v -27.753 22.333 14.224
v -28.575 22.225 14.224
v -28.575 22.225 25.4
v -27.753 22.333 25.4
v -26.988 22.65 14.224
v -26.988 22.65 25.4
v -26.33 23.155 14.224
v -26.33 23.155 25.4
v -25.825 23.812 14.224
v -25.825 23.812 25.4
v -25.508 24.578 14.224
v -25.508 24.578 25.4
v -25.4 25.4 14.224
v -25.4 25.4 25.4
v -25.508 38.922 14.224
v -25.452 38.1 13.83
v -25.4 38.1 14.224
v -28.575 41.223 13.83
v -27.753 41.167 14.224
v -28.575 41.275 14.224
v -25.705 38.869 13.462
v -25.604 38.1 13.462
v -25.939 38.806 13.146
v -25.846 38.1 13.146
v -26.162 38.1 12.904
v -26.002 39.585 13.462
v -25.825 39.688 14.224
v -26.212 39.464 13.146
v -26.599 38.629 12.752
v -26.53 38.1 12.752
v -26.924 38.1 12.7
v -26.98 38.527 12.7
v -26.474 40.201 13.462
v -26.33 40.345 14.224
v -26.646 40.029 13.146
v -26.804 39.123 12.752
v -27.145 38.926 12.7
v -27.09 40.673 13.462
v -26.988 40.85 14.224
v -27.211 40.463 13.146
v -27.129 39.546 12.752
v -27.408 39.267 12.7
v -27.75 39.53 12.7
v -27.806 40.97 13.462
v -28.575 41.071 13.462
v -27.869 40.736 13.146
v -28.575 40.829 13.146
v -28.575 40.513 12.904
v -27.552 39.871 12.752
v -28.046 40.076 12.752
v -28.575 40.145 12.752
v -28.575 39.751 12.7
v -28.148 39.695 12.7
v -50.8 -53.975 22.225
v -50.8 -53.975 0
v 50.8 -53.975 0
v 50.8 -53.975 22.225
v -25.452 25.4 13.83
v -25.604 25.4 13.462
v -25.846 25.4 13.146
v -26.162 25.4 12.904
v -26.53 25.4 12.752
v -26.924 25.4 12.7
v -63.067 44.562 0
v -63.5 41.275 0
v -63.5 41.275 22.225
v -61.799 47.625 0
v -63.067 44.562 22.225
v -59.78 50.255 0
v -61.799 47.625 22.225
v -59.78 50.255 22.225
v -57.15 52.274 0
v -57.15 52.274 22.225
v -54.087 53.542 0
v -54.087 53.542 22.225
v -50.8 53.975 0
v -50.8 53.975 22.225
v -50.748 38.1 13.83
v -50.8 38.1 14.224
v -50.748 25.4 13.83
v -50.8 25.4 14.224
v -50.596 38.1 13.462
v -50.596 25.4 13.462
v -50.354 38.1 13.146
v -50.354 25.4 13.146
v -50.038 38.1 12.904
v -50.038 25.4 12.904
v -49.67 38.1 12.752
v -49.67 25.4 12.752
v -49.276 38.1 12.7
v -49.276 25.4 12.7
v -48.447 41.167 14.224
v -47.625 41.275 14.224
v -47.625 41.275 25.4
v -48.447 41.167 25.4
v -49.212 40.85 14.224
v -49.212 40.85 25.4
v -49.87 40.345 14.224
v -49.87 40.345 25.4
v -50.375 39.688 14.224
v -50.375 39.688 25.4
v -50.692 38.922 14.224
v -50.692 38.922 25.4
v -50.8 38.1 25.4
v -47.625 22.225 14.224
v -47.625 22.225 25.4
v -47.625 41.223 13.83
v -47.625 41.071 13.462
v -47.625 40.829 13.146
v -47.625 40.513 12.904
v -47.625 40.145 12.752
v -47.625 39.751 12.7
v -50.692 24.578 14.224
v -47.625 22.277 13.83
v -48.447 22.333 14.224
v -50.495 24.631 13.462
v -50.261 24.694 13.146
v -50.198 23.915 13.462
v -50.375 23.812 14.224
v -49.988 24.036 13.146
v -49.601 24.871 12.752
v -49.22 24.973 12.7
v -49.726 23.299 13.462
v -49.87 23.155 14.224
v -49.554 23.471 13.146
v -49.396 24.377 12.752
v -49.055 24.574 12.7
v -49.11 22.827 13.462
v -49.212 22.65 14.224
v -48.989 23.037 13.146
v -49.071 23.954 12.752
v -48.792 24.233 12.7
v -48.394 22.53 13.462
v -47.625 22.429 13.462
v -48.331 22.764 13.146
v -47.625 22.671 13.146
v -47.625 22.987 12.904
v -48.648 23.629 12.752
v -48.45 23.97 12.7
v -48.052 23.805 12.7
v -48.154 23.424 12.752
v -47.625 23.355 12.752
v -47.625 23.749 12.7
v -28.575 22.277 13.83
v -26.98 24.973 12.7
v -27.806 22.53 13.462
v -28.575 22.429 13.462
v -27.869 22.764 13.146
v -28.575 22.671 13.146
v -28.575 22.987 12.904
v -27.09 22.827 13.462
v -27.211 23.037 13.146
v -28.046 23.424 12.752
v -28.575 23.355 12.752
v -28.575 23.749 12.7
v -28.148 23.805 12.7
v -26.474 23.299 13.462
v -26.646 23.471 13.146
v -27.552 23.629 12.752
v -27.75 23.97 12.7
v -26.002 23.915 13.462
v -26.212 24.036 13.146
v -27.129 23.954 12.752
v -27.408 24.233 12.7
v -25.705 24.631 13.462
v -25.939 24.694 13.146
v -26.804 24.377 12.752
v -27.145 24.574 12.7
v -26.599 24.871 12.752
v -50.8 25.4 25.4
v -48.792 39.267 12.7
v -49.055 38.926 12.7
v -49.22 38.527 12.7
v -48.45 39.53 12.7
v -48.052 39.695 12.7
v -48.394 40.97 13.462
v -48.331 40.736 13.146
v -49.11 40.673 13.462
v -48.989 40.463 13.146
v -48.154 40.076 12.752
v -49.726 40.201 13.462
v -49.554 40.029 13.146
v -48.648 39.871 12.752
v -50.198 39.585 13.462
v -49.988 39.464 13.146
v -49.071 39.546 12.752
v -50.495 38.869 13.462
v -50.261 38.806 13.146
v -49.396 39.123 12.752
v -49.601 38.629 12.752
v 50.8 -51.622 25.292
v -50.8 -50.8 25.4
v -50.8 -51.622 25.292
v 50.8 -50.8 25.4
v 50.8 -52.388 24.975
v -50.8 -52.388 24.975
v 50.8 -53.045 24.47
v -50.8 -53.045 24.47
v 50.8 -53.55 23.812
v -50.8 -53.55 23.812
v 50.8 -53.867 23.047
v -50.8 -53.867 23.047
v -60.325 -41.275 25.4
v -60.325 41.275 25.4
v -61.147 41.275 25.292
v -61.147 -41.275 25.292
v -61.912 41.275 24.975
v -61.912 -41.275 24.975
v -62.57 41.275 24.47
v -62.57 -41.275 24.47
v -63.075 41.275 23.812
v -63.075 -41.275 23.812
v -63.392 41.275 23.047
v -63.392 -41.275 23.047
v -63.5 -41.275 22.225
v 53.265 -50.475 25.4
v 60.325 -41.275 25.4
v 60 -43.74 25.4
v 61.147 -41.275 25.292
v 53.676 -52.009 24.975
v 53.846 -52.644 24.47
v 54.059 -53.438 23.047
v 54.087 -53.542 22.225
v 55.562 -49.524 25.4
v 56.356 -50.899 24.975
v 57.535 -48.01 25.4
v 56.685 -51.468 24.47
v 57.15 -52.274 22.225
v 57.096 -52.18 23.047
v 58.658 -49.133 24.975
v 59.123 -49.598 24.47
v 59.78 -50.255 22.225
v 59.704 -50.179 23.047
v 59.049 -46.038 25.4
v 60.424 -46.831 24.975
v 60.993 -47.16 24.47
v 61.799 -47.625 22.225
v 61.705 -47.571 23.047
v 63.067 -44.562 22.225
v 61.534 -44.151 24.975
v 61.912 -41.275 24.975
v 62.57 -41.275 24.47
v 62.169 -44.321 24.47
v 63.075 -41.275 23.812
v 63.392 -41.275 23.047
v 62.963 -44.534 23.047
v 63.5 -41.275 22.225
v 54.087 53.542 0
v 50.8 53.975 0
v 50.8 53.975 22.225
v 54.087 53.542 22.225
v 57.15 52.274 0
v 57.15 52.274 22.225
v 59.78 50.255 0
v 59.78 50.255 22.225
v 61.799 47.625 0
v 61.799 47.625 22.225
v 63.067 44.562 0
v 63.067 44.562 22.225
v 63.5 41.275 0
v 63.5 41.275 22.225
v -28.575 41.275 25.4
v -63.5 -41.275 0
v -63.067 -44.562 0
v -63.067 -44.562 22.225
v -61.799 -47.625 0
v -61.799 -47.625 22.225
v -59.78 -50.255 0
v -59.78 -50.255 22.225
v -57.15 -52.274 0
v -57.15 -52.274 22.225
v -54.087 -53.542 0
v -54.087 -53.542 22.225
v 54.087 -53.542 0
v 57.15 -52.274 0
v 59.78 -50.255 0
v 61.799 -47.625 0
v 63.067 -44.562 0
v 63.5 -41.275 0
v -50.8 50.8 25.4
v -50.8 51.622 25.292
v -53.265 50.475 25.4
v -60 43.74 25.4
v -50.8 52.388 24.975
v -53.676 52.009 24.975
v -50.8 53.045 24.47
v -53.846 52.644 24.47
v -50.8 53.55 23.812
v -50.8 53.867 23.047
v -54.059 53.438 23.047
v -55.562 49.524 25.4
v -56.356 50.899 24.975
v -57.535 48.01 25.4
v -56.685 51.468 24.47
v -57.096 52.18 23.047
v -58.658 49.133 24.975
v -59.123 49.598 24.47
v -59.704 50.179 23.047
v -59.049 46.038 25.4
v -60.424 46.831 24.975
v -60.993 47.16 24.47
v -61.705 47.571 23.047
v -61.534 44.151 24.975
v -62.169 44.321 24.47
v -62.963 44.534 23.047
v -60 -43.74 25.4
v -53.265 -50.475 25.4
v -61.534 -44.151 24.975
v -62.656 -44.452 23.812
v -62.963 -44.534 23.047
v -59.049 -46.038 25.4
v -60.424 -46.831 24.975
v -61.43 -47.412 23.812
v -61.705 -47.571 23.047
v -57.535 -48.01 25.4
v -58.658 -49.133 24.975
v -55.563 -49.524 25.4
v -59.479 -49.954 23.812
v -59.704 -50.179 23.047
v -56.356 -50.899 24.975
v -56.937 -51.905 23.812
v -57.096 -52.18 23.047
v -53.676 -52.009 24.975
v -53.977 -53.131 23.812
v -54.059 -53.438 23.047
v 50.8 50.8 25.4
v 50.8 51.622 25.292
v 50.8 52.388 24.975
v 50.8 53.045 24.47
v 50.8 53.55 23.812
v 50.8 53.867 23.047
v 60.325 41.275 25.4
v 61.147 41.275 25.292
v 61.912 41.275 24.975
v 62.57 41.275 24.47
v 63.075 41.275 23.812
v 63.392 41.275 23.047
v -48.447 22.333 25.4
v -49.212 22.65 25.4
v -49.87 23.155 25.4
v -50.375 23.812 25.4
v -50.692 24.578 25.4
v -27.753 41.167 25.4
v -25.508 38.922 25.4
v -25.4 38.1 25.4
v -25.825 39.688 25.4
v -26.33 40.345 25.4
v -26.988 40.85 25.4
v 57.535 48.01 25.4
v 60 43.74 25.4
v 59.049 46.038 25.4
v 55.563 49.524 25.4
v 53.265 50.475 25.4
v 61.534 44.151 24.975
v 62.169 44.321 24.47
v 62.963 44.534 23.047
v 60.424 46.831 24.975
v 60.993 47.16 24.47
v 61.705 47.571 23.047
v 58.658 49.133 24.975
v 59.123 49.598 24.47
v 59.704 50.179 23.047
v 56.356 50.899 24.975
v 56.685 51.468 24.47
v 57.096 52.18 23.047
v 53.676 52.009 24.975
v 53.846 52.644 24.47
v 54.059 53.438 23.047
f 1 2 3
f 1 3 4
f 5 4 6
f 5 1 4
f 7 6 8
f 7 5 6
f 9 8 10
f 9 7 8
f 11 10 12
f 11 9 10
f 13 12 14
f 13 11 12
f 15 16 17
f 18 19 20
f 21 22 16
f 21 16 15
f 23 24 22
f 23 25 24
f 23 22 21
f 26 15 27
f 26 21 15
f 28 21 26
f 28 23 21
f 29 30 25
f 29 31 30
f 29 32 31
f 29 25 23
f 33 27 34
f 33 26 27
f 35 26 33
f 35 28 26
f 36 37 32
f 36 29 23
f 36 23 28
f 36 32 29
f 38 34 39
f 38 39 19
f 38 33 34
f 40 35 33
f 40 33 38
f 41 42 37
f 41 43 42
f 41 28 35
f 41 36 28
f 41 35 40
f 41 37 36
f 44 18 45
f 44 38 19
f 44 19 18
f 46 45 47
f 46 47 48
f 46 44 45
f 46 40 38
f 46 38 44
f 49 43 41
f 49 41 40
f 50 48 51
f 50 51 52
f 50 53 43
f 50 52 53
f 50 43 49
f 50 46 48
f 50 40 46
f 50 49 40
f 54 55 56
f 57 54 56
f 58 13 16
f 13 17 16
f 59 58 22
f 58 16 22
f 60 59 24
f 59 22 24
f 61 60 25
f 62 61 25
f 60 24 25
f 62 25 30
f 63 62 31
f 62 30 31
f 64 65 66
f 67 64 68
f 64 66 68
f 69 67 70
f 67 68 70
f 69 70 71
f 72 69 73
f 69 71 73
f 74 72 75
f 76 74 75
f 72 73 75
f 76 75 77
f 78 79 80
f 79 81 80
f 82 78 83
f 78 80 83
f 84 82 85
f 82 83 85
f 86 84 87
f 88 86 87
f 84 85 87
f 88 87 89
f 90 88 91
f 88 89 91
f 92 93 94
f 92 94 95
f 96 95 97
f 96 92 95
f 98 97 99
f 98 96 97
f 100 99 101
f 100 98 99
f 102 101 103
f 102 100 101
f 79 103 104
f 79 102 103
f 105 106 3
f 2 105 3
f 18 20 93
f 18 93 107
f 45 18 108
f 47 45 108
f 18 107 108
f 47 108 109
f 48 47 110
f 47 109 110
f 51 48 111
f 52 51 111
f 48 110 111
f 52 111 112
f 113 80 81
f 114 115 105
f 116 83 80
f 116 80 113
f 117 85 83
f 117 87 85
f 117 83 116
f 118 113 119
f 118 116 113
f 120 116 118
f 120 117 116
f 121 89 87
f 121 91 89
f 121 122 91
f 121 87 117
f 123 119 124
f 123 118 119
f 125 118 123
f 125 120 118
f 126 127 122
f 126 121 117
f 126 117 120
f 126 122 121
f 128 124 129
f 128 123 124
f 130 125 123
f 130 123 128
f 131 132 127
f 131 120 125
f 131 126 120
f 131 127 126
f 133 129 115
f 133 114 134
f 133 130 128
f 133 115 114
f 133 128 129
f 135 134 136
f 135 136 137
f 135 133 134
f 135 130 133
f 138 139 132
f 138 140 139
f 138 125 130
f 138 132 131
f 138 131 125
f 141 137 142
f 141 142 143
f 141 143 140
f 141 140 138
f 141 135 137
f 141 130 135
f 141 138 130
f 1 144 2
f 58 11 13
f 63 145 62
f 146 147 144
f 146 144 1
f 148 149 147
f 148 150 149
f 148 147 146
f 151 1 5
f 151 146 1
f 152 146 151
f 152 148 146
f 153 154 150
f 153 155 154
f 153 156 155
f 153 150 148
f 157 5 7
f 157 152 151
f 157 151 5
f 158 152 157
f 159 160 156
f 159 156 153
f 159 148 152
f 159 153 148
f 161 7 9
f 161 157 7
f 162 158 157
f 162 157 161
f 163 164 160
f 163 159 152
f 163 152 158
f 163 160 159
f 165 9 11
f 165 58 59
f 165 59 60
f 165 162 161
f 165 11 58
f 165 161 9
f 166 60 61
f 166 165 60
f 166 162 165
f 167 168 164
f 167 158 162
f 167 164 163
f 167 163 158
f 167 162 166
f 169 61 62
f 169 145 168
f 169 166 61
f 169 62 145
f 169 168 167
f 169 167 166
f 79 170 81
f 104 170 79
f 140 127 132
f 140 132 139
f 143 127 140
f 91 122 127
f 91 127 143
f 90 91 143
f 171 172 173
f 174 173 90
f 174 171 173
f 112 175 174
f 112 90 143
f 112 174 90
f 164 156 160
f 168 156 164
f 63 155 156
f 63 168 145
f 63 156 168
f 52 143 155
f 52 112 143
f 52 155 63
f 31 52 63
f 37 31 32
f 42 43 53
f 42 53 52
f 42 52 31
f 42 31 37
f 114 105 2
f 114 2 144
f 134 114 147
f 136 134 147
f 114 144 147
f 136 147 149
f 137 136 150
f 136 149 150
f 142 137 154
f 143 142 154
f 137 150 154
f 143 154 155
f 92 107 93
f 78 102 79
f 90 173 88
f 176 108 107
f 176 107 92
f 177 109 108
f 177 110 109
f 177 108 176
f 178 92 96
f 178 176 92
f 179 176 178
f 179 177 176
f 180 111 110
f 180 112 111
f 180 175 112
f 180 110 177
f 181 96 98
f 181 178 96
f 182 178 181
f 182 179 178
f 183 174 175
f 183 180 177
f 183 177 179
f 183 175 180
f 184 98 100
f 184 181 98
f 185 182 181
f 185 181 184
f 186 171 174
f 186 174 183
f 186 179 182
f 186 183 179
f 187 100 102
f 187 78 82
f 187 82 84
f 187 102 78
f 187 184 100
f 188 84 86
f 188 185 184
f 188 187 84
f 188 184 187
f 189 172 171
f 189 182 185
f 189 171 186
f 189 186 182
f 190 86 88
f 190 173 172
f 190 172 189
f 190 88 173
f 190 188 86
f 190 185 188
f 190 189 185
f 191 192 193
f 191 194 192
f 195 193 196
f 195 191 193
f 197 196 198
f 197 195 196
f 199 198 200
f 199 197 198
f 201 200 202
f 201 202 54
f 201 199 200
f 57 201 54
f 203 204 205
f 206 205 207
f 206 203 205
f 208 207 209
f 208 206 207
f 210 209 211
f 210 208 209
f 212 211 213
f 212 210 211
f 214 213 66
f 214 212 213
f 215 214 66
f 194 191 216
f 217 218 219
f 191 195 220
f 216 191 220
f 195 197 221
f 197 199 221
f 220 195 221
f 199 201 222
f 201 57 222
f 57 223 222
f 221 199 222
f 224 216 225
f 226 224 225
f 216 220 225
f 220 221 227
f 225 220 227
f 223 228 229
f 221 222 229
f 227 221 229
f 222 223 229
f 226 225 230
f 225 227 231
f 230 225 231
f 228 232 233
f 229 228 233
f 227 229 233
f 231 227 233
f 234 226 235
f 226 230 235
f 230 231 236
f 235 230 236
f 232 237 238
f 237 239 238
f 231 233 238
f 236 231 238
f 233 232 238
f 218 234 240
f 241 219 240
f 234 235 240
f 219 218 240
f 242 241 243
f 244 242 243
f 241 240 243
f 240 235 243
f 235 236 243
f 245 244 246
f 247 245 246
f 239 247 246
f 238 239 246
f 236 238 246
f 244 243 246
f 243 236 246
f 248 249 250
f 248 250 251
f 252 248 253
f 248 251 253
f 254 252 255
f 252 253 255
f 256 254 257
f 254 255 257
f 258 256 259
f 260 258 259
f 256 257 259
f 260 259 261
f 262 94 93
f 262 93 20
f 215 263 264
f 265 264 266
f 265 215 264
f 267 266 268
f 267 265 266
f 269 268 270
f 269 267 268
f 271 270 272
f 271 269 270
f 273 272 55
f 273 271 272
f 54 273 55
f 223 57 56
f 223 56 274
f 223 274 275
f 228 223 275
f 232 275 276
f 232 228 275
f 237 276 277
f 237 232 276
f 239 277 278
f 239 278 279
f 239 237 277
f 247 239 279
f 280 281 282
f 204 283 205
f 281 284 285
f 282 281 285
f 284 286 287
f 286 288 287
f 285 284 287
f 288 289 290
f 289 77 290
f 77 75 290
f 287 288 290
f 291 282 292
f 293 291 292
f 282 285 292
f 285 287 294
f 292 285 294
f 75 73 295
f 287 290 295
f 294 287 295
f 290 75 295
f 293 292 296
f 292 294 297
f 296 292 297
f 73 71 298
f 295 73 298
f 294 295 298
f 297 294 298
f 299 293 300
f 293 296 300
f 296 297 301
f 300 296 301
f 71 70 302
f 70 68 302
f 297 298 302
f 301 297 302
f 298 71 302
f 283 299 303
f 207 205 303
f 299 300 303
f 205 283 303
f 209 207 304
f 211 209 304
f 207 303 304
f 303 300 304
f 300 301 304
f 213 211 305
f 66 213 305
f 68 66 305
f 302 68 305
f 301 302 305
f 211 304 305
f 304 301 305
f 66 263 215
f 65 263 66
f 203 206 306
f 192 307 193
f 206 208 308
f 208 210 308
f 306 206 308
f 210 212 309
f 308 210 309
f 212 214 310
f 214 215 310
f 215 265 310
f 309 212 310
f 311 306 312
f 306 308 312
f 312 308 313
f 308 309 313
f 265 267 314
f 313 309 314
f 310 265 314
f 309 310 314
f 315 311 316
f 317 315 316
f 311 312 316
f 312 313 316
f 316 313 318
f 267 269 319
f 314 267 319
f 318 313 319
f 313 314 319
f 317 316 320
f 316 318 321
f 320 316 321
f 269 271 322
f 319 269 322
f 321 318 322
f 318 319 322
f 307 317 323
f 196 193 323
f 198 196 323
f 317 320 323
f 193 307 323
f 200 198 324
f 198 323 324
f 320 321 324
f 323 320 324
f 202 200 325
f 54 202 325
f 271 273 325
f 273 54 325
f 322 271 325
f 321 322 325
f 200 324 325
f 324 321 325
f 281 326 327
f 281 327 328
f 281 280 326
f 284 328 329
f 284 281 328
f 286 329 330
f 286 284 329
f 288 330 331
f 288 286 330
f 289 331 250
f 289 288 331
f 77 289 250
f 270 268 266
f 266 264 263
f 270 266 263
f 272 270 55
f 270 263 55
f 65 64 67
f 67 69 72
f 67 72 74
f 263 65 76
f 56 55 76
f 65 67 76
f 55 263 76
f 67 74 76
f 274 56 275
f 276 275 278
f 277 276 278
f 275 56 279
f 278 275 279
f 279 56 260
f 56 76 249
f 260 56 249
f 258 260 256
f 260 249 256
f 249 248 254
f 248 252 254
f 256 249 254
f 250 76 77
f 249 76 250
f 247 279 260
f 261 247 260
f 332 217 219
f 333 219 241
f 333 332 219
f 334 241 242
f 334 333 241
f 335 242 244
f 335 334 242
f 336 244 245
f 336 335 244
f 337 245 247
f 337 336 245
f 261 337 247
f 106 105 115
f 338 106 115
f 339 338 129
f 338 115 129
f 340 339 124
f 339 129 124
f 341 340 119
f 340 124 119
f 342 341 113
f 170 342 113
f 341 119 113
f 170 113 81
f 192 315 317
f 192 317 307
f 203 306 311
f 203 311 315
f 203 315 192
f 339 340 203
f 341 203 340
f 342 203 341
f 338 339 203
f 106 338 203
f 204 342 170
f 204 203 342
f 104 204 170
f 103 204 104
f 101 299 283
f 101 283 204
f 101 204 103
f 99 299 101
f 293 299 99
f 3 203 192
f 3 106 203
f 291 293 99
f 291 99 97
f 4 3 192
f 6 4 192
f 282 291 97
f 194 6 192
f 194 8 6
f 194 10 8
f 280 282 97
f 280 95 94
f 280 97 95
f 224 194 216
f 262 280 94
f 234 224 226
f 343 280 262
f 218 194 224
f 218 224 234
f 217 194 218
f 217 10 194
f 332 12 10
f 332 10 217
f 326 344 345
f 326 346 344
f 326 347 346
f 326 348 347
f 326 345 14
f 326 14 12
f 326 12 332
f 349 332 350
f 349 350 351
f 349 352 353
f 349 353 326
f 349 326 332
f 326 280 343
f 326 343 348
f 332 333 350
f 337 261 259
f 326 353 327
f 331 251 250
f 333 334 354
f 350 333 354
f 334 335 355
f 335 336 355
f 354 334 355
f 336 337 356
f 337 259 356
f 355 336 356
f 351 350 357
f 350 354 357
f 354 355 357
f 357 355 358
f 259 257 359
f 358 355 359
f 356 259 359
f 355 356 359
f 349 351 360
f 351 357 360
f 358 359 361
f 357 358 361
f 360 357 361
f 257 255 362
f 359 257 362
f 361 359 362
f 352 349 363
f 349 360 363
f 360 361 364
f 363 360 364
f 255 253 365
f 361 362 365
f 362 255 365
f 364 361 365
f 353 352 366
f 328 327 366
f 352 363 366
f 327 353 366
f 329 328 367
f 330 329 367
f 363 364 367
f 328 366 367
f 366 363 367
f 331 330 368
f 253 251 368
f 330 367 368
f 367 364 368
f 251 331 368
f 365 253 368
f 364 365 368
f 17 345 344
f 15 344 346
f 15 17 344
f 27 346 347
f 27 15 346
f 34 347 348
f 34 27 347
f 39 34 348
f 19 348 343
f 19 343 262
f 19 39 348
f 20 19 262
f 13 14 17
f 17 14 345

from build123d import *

# Parameters (mm, degrees)
F0_W     = 127
F0_H     = 107.95
F1_DEPTH = 25.4
F2_W     = 25.4
F2_H     = 19.05
F3_DEPTH = 12.7
F4_R     = 3.175
F5_R     = 1.524
F6_R     = 12.7
F7_R     = 3.175


with BuildPart() as f1:
    # F0 (on Top) → F1 (new body)
    with BuildSketch(Plane.XY):
        Rectangle(F0_W, F0_H)
    extrude(amount=F1_DEPTH)

    # F2 (on face) → F3 (cut)
    with BuildSketch(Plane.XY.offset(25.4)):
        with Locations((-38.1, 31.75)):
            Rectangle(F2_W, F2_H)
    extrude(amount=-F3_DEPTH, mode=Mode.SUBTRACT)

    # F4
    f4_edges = [f1.edges().sort_by_distance(p)[0] for p in [
        (-50.8, 41.275, 19.05),
        (-50.8, 22.225, 19.05),
        (-25.4, 22.225, 19.05),
        (-25.4, 41.275, 19.05),
    ]]
    fillet(f4_edges, radius=F4_R)

    # F5
    f5_edges = [f1.edges().sort_by_distance(p)[0] for p in [
        (-38.1, 22.225, 12.7),
    ]]
    fillet(f5_edges, radius=F5_R)

    # F6
    f6_edges = [f1.edges().sort_by_distance(p)[0] for p in [
        (63.5, -53.975, 12.7),
        (63.5, 53.975, 12.7),
        (-63.5, -53.975, 12.7),
        (-63.5, 53.975, 12.7),
    ]]
    fillet(f6_edges, radius=F6_R)

    # F7
    f7_edges = [f1.edges().sort_by_distance(p)[0] for p in [
        (0, -53.975, 25.4),
    ]]
    fillet(f7_edges, radius=F7_R)


solid = f1.part
